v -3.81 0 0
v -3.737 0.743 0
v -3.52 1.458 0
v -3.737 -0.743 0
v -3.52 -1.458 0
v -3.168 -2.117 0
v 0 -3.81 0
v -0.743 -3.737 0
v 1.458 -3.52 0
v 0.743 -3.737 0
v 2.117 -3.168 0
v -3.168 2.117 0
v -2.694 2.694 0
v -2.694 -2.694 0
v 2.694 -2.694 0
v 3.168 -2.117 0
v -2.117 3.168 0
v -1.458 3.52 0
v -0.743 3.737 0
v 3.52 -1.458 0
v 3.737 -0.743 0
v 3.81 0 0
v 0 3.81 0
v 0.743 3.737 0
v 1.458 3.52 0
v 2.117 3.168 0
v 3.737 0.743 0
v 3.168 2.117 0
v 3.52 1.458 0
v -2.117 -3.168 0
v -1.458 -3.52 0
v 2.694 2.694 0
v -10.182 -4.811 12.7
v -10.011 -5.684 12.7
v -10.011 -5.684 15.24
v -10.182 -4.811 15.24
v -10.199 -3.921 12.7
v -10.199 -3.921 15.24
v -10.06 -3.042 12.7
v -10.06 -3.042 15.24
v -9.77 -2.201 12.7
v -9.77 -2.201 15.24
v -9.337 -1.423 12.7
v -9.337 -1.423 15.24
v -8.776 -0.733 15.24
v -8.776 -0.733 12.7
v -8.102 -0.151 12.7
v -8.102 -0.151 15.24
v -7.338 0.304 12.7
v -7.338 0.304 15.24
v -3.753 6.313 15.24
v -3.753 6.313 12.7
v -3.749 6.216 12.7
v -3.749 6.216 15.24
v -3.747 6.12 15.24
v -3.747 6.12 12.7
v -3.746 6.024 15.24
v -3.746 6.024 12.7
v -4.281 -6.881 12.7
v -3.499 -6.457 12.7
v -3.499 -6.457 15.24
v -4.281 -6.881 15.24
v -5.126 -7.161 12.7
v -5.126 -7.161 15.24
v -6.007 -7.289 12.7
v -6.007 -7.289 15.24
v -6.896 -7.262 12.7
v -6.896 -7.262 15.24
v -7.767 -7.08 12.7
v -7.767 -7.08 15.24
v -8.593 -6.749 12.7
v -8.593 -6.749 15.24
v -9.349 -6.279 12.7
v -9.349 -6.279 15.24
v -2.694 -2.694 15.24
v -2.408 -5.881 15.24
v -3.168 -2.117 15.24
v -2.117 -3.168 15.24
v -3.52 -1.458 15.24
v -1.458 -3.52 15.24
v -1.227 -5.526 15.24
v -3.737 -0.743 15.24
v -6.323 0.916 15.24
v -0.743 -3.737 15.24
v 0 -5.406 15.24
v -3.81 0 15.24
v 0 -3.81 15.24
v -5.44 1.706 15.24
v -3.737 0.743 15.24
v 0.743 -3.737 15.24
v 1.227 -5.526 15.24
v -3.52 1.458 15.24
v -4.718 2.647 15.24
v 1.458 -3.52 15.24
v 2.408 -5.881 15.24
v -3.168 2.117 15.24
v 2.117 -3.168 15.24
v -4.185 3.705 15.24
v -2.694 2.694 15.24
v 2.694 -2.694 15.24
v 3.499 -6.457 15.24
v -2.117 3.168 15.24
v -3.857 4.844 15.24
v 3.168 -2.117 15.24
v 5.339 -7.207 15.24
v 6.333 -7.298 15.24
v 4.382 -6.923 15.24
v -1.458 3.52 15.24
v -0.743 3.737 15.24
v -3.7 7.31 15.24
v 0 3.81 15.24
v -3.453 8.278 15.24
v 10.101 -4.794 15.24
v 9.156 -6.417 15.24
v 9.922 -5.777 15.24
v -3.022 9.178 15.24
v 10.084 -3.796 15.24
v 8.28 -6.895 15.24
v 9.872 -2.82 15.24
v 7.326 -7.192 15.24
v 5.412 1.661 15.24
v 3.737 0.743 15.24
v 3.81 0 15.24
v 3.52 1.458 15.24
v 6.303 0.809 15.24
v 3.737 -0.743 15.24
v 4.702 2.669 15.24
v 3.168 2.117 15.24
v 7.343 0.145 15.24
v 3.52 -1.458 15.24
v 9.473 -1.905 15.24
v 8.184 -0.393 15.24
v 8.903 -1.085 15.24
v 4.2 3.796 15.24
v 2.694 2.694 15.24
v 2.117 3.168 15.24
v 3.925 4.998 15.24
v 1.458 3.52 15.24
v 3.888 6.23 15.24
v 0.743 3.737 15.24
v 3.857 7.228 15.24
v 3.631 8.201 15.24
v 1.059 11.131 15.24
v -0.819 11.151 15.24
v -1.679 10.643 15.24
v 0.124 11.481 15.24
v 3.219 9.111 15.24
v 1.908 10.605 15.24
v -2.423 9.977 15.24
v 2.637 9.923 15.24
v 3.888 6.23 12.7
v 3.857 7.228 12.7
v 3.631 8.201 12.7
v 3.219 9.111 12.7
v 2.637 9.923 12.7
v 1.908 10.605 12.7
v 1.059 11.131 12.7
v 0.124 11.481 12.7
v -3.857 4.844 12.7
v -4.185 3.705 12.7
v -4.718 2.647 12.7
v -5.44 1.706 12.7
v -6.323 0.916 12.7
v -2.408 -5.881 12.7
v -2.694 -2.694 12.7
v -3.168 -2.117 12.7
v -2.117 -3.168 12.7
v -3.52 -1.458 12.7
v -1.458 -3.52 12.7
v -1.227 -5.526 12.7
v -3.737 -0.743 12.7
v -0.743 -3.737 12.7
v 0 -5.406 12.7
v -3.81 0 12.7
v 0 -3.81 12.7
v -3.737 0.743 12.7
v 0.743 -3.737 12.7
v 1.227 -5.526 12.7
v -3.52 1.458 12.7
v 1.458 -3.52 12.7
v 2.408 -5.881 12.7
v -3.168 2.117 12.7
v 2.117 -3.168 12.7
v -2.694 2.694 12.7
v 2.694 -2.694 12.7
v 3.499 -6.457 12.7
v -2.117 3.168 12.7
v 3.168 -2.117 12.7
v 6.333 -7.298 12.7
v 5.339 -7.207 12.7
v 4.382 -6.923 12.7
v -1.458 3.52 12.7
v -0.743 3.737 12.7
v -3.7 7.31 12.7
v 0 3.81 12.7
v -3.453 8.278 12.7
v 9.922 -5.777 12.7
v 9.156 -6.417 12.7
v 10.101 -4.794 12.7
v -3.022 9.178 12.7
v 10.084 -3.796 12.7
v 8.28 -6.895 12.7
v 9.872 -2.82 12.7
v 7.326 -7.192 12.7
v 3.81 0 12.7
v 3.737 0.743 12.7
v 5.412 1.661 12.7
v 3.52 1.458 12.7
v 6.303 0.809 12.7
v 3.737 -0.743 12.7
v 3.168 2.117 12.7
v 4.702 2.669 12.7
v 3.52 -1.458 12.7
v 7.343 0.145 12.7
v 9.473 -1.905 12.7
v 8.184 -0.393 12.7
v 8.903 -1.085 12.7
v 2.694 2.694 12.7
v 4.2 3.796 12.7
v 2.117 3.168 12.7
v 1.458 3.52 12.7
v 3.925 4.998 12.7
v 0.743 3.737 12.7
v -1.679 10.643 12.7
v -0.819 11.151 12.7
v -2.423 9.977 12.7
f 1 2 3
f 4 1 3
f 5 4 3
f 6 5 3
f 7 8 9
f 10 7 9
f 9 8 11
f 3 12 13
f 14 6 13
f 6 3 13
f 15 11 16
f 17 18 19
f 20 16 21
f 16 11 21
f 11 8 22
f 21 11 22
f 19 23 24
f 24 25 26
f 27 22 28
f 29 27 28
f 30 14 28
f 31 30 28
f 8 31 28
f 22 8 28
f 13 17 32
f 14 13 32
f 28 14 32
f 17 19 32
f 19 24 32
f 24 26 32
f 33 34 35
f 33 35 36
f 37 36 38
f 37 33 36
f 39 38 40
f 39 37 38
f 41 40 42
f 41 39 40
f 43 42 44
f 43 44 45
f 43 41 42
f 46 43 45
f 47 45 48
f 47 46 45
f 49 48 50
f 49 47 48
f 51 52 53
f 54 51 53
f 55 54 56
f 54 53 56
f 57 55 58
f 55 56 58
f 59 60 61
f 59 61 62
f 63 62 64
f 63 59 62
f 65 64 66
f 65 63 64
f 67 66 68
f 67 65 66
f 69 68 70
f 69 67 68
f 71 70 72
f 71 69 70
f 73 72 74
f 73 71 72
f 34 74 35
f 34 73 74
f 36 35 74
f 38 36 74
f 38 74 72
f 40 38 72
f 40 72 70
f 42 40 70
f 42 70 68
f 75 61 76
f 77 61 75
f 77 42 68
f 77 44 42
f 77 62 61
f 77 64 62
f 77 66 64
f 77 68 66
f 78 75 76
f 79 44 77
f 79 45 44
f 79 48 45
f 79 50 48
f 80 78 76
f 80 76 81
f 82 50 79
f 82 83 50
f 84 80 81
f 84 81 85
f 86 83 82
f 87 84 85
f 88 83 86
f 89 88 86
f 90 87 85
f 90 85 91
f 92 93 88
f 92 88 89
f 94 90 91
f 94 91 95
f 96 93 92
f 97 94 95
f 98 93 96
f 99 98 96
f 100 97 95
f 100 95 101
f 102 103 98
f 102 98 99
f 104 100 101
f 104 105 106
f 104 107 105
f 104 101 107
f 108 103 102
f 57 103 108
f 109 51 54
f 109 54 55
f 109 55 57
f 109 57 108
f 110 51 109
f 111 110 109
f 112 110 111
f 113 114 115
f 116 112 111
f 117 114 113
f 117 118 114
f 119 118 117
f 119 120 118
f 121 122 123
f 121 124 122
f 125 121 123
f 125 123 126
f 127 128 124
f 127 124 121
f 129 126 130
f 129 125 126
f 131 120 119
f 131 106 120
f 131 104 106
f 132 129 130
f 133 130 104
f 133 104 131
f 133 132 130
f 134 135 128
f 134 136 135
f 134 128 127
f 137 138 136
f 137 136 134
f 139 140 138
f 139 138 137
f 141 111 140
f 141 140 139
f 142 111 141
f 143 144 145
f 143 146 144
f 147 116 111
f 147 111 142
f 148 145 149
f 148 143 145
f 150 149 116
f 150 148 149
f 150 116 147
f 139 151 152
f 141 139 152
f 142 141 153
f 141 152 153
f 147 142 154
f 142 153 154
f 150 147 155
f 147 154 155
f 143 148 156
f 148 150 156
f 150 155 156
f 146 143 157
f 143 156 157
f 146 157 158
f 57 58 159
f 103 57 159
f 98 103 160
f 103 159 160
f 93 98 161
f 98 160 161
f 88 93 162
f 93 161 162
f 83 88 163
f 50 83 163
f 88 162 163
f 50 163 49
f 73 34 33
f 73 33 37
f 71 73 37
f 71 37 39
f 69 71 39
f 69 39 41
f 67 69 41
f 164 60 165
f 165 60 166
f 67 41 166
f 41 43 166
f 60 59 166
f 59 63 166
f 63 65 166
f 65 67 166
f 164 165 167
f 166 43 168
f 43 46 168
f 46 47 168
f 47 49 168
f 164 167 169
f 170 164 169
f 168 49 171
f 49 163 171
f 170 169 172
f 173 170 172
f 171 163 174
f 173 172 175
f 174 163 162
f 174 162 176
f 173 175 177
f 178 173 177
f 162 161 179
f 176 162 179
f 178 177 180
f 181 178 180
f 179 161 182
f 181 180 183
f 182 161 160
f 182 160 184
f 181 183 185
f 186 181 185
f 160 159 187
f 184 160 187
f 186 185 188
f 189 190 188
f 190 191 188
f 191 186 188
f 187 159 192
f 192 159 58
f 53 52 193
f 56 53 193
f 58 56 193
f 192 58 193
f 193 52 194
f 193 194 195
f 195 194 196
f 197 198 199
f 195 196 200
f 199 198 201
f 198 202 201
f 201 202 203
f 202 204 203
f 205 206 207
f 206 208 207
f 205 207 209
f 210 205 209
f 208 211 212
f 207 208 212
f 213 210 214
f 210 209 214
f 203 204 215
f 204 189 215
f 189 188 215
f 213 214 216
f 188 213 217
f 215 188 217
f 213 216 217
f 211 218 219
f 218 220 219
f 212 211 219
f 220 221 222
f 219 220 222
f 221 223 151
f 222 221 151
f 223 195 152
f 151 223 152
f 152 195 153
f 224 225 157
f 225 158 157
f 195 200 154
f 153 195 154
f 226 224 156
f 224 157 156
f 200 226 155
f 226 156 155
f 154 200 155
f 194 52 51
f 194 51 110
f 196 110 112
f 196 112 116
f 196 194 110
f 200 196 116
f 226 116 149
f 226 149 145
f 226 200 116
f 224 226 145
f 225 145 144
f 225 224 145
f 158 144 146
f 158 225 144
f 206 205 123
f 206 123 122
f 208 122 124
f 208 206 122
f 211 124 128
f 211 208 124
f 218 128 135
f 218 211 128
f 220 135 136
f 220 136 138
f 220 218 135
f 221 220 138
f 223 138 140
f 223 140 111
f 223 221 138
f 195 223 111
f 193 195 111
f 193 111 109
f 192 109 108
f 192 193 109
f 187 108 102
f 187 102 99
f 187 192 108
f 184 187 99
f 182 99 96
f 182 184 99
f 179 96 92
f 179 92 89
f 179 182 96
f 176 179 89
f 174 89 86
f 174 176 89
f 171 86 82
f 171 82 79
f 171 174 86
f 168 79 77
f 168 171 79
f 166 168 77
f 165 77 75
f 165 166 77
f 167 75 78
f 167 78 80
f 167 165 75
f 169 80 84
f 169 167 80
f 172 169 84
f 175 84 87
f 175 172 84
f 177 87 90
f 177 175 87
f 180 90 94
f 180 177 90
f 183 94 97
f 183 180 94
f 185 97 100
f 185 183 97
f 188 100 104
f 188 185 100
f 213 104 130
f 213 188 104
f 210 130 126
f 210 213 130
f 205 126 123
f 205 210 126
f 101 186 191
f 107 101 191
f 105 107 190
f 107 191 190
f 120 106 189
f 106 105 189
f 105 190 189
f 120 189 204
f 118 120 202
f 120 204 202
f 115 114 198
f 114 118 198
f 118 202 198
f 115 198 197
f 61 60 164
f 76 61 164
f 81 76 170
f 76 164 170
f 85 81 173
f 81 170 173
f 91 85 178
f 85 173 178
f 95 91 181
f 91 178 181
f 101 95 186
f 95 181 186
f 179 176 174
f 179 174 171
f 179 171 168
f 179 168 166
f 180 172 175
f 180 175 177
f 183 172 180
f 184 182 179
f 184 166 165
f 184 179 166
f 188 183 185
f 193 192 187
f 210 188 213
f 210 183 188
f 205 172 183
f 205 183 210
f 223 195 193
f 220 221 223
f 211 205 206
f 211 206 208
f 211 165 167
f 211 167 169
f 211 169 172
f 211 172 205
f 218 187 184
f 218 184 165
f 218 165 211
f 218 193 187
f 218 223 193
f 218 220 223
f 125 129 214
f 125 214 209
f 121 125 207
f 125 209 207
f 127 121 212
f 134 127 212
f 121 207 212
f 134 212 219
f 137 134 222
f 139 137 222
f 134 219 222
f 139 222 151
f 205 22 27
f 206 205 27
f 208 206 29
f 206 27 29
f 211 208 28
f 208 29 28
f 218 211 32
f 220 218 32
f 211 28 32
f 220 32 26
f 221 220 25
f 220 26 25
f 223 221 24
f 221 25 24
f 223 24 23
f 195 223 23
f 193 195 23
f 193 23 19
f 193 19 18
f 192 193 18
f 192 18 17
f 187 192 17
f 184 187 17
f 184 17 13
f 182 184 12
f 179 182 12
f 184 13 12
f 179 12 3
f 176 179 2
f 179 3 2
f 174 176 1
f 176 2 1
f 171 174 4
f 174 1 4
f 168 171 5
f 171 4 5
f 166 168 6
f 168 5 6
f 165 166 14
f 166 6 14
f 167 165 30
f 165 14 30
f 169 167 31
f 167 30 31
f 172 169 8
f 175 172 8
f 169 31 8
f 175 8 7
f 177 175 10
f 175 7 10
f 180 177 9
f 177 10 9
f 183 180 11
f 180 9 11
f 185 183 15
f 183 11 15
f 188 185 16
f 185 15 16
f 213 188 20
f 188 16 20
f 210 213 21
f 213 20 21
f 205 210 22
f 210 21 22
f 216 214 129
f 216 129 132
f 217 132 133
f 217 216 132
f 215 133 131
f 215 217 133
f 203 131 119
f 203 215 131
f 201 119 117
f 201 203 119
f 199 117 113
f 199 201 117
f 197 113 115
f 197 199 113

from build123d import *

# Parameters (mm, degrees)
F0_R        = 3.81
F1_DEPTH    = 12.7
F2_R        = 3.81
F3_DEPTH    = 2.54
F4_T1_DEPTH = 42.0384776465


# Not quite as in the source:
# - a fillet or chamfer that OpenCascade refuses, or shapes differently, is made with other operations: its cross-section is extruded or revolved along the edge and cut away or added


with BuildPart() as f1:
    # F0 (on Top) → F1 (new body)
    with BuildSketch(Plane.XY):
        Circle(F0_R)
    extrude(amount=F1_DEPTH)


with BuildPart() as f3:
    # F2 (on face) → F3 (new body)
    with BuildSketch(Plane.XY.offset(12.7)):
        with BuildLine():
            ThreePointArc((11.7509897523, -0.35949854), (4.7016682053, 2.6691615996), (5.7140252702, 10.274478798))
            ThreePointArc((5.7140252702, 10.274478798), (0.1269192039, 11.7558024343), (-5.4908664559, 10.3954502029))
            ThreePointArc((-5.4908664559, 10.3954502029), (-4.1984383287, 8.3771195895), (-3.7461525862, 6.0235124566))
            ThreePointArc((-3.7461525862, 6.0235124566), (-6.2372414103, 0.980566439), (-11.7560122827, -0.1057098259))
            ThreePointArc((-11.7560122827, -0.1057098259), (-10.2232663206, -5.8051550451), (-6.1140496846, -10.041583332))
            ThreePointArc((-6.1140496846, -10.041583332), (0, -5.4064875434), (6.1140496846, -10.041583332))
            ThreePointArc((6.1140496846, -10.041583332), (10.16, -5.9151837975), (11.7509897523, -0.35949854))
        make_face()
        Circle(F2_R, mode=Mode.SUBTRACT)
    extrude(amount=F3_DEPTH)

    # F4: fillet of radius 5.08 on 6 edges, made by hand

    # F4_s2 → F4_t1 (cut)
    with BuildSketch(Plane.XY.offset(-7.0492388233)):
        with BuildLine():
            ThreePointArc((7.3426084647, 0.1454248286), (10.0242781389, -3.4122038252), (8.8706351528, -7.7153633319))
            ThreePointArc((8.8706351528, -7.7153633319), (10.9471475801, -4.2866022929), (11.7509897523, -0.35949854))
            ThreePointArc((11.7509897523, -0.35949854), (9.5012608724, -0.5046217571), (7.3426084647, 0.1454248286))
        make_face()
        with BuildLine():
            ThreePointArc((3.888167348, 6.230345265), (2.2077692466, 10.3564010208), (-2.0785006989, 11.5712935406))
            ThreePointArc((-2.0785006989, 11.5712935406), (1.9299460735, 11.5969956244), (5.7140252702, 10.274478798))
            ThreePointArc((5.7140252702, 10.274478798), (4.4363623338, 8.4170832554), (3.888167348, 6.230345265))
        make_face()
        with BuildLine():
            ThreePointArc((-3.7527473325, 6.3128388943), (-1.9836590084, 10.4016529498), (2.3278414748, 11.5237213359))
            ThreePointArc((2.3278414748, 11.5237213359), (-1.6791160458, 11.6359601522), (-5.4908664559, 10.3954502029))
            ThreePointArc((-5.4908664559, 10.3954502029), (-4.2536026695, 8.5109027497), (-3.7527473325, 6.3128388943))
        make_face()
        with BuildLine():
            ThreePointArc((-9.0351428515, -7.522047129), (-10.0956113335, -3.1949834043), (-7.337757218, 0.3039185031))
            ThreePointArc((-7.337757218, 0.3039185031), (-9.5099410225, -0.299371063), (-11.7560122827, -0.1057098259))
            ThreePointArc((-11.7560122827, -0.1057098259), (-11.0371440012, -4.0492532221), (-9.0351428515, -7.522047129))
        make_face()
        with BuildLine():
            ThreePointArc((-3.4985504193, -6.4571814602), (-7.9163168625, -7.0328667329), (-11.088943922, -3.9051660725))
            ThreePointArc((-11.088943922, -3.9051660725), (-9.1323409623, -7.4037387789), (-6.1140496846, -10.041583332))
            ThreePointArc((-6.1140496846, -10.041583332), (-5.1295715595, -8.0134946746), (-3.4985504193, -6.4571814602))
        make_face()
        with BuildLine():
            ThreePointArc((3.4985504193, -6.4571814602), (7.9163168625, -7.0328667329), (11.088943922, -3.9051660725))
            ThreePointArc((11.088943922, -3.9051660725), (9.1323409623, -7.4037387789), (6.1140496846, -10.041583332))
            ThreePointArc((6.1140496846, -10.041583332), (5.1295715595, -8.0134946746), (3.4985504193, -6.4571814602))
        make_face()
    extrude(amount=F4_T1_DEPTH, mode=Mode.SUBTRACT)


solid = Compound([f1.part, f3.part])
